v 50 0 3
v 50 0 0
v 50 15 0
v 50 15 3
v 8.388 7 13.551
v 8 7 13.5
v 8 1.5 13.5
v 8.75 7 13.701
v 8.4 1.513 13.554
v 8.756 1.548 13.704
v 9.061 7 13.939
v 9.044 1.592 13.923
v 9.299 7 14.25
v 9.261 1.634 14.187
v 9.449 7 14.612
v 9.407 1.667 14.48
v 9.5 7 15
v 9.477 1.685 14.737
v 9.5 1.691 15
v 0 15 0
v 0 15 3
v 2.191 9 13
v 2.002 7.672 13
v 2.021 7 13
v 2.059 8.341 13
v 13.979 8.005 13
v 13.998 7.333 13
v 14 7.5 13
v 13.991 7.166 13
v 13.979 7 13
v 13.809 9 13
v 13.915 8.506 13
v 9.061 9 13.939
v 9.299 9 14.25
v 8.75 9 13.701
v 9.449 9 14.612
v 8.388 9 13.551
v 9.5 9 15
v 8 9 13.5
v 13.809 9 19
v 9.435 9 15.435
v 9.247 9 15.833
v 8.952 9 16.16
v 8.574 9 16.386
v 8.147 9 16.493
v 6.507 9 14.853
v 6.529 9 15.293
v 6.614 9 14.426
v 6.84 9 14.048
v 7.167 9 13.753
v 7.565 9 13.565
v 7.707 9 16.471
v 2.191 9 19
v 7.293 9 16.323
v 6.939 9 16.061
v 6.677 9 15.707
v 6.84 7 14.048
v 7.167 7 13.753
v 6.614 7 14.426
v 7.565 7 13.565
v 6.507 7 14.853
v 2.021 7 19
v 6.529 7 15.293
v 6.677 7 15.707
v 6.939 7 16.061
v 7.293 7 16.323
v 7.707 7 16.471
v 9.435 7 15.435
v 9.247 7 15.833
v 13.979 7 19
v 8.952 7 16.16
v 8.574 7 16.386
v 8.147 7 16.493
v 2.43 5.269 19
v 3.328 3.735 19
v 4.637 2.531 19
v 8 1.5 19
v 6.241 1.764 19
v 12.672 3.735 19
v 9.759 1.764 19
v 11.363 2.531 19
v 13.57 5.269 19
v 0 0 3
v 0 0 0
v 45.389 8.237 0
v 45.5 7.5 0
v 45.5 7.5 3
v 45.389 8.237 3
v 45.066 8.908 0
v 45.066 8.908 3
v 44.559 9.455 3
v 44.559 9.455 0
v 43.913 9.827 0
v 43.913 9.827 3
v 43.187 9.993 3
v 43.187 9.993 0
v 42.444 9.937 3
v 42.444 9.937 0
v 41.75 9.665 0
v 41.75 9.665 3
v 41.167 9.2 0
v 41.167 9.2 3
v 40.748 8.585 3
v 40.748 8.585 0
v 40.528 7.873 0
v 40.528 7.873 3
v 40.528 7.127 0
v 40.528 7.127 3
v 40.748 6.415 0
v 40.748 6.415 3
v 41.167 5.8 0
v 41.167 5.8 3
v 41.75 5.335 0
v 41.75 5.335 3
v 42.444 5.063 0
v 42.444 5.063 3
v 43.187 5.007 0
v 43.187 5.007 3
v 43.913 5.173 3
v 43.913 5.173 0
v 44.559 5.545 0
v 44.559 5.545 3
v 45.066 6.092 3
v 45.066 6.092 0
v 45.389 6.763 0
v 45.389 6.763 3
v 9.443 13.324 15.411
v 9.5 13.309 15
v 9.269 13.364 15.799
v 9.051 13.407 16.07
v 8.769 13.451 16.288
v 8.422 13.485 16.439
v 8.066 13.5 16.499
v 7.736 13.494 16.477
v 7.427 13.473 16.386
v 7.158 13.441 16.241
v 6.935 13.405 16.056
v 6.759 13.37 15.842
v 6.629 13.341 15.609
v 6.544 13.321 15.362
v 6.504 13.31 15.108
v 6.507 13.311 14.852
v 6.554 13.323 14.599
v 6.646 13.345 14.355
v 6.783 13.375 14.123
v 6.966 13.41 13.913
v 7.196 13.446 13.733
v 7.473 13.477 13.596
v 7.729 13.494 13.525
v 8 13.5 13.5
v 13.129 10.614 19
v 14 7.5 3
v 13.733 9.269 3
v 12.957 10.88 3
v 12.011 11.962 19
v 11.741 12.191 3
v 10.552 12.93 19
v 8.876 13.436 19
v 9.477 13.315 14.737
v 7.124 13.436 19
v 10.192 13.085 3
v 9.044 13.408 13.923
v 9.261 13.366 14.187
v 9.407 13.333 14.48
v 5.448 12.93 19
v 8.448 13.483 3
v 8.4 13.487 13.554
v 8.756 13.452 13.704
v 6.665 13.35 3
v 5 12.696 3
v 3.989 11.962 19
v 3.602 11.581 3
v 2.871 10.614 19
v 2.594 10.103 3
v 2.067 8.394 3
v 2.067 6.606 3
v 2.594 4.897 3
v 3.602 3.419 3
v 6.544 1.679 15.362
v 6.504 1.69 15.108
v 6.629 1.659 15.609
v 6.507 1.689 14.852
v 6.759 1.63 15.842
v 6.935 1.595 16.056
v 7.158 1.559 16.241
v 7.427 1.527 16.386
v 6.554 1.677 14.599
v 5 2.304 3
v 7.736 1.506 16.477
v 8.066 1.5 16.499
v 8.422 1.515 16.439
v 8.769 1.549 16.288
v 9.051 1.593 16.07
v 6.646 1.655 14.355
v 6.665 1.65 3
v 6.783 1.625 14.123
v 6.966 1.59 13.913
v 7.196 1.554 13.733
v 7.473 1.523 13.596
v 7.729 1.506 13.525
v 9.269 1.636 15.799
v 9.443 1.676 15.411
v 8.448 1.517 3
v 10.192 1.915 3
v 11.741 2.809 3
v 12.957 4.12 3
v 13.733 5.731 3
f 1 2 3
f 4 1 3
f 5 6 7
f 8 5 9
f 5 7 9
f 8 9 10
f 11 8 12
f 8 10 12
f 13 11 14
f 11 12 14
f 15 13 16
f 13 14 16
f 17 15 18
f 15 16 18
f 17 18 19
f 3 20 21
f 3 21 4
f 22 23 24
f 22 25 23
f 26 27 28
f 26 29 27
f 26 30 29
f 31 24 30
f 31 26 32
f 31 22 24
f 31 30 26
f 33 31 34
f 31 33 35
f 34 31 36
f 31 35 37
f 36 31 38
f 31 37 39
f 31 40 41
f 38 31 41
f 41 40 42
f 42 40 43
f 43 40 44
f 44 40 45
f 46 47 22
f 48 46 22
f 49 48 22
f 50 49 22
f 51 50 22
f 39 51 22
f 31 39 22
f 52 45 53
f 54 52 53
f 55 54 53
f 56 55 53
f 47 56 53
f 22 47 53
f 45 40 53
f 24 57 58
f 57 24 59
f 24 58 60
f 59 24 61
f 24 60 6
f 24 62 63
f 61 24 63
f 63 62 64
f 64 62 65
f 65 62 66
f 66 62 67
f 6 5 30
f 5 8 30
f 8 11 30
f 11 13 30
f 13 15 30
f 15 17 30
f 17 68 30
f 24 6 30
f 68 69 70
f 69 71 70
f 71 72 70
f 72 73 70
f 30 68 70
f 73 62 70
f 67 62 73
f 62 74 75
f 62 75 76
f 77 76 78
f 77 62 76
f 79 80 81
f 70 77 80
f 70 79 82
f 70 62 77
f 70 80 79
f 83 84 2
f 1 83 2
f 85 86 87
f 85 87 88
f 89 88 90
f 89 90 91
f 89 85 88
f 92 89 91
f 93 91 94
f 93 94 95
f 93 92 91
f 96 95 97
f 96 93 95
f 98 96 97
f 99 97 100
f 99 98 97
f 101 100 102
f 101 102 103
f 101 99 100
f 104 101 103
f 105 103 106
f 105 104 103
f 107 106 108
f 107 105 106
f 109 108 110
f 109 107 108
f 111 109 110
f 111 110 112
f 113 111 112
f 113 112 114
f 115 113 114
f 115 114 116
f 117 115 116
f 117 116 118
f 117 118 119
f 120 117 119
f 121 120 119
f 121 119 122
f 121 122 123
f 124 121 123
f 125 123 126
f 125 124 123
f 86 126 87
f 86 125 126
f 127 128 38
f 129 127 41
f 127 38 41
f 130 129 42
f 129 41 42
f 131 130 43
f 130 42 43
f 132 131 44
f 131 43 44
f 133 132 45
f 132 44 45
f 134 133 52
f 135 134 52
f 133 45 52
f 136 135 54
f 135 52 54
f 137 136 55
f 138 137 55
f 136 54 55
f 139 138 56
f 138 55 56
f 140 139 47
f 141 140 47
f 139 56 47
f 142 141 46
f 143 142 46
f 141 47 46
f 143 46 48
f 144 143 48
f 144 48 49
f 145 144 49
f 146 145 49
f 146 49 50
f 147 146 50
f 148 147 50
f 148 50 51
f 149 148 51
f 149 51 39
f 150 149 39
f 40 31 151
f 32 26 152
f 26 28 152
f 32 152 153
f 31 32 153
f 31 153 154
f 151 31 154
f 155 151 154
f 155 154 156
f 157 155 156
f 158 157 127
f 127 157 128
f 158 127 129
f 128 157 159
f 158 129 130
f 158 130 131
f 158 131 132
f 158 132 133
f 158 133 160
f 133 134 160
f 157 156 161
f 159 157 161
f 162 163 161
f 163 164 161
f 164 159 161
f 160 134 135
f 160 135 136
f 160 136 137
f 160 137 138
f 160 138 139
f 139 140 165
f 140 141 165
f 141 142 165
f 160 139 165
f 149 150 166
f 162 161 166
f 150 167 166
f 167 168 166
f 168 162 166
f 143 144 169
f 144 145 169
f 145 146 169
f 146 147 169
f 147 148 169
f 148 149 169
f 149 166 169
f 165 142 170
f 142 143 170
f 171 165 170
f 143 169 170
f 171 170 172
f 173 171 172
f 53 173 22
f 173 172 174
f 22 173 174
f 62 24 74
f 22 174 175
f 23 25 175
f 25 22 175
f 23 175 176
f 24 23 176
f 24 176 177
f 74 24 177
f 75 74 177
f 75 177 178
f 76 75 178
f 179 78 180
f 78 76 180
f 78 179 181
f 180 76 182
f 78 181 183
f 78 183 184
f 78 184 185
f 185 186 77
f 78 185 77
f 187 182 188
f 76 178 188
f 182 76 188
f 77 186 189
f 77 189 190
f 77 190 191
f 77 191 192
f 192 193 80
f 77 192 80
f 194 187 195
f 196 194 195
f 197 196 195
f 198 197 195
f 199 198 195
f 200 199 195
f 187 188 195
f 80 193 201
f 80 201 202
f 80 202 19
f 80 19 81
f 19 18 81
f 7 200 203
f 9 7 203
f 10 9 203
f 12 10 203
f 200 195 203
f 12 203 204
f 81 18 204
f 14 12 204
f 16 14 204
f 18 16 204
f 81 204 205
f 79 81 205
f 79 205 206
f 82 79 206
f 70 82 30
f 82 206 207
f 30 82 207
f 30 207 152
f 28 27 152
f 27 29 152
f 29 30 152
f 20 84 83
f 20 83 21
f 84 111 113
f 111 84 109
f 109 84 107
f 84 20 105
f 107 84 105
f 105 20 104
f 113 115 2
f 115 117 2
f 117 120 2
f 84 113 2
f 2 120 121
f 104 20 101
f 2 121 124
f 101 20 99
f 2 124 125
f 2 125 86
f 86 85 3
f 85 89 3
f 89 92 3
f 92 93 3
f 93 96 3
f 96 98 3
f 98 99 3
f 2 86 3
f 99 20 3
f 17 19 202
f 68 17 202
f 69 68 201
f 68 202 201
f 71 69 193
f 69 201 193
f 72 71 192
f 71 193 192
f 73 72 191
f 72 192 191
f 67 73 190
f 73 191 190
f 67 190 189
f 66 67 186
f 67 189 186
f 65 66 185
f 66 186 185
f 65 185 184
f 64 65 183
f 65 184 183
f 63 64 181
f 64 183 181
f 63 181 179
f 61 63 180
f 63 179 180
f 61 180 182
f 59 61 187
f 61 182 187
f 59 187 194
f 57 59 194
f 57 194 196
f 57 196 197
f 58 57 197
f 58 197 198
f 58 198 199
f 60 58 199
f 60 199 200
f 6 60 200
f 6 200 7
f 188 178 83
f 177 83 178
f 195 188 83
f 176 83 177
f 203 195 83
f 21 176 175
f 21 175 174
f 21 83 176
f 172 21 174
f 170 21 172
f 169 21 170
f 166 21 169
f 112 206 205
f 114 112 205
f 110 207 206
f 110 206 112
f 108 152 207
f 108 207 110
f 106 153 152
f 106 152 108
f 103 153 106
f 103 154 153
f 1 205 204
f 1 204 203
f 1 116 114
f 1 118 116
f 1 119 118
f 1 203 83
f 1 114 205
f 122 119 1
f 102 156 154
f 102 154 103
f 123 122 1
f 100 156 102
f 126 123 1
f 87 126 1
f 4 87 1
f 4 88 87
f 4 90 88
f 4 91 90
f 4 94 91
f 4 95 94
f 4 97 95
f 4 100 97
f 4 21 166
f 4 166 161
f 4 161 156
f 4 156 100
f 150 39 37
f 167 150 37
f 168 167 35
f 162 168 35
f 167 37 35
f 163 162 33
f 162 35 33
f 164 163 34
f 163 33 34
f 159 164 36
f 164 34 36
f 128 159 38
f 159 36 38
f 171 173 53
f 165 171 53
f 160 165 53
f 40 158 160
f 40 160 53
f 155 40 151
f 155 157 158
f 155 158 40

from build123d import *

# Parameters (mm, degrees)
F0_W     = 50
F0_H     = 15
F0_R     = 6
F0_R_2   = 2.5
F1_DEPTH = 3
F2_R     = 6
F3_DEPTH = 19
F6_DEPTH = 6
F9_DEPTH = 25


with BuildPart() as f1:
    # F0 (on Top) → F1 (new body)
    with BuildSketch(Plane.XY):
        with Locations((25, 7.5)):
            Rectangle(F0_W, F0_H)
        with Locations((8, 7.5)):
            Circle(F0_R, mode=Mode.SUBTRACT)
        with Locations((43, 7.5)):
            Circle(F0_R_2, mode=Mode.SUBTRACT)
        with Locations((8, 7.5)):
            Circle(F0_R)
    extrude(amount=F1_DEPTH)

    # F2 (on Top) → F3 (join)
    with BuildSketch(Plane.XY):
        with Locations((8, 7.5)):
            Circle(F2_R)
    extrude(amount=F3_DEPTH)

    # F5 (on offset) → F6 (cut)
    with BuildSketch(Plane.XY.offset(19)):
        Polygon((0, 8), (0, 7), (14.8029690608, 7), (14.8029690608, 8.9999996126), (0, 8.9999996126), align=None)
    extrude(amount=-F6_DEPTH, mode=Mode.SUBTRACT)

    # F8 (on offset) → F9 (cut)
    with BuildSketch(Plane.XZ):
        with BuildLine():
            ThreePointArc((8, 13.5), (9.0606601718, 13.9393398282), (9.5, 15))
            ThreePointArc((9.5, 15), (6.9393398282, 16.0606601718), (8, 13.5))
        make_face()
    extrude(amount=-F9_DEPTH, mode=Mode.SUBTRACT)


solid = f1.part
